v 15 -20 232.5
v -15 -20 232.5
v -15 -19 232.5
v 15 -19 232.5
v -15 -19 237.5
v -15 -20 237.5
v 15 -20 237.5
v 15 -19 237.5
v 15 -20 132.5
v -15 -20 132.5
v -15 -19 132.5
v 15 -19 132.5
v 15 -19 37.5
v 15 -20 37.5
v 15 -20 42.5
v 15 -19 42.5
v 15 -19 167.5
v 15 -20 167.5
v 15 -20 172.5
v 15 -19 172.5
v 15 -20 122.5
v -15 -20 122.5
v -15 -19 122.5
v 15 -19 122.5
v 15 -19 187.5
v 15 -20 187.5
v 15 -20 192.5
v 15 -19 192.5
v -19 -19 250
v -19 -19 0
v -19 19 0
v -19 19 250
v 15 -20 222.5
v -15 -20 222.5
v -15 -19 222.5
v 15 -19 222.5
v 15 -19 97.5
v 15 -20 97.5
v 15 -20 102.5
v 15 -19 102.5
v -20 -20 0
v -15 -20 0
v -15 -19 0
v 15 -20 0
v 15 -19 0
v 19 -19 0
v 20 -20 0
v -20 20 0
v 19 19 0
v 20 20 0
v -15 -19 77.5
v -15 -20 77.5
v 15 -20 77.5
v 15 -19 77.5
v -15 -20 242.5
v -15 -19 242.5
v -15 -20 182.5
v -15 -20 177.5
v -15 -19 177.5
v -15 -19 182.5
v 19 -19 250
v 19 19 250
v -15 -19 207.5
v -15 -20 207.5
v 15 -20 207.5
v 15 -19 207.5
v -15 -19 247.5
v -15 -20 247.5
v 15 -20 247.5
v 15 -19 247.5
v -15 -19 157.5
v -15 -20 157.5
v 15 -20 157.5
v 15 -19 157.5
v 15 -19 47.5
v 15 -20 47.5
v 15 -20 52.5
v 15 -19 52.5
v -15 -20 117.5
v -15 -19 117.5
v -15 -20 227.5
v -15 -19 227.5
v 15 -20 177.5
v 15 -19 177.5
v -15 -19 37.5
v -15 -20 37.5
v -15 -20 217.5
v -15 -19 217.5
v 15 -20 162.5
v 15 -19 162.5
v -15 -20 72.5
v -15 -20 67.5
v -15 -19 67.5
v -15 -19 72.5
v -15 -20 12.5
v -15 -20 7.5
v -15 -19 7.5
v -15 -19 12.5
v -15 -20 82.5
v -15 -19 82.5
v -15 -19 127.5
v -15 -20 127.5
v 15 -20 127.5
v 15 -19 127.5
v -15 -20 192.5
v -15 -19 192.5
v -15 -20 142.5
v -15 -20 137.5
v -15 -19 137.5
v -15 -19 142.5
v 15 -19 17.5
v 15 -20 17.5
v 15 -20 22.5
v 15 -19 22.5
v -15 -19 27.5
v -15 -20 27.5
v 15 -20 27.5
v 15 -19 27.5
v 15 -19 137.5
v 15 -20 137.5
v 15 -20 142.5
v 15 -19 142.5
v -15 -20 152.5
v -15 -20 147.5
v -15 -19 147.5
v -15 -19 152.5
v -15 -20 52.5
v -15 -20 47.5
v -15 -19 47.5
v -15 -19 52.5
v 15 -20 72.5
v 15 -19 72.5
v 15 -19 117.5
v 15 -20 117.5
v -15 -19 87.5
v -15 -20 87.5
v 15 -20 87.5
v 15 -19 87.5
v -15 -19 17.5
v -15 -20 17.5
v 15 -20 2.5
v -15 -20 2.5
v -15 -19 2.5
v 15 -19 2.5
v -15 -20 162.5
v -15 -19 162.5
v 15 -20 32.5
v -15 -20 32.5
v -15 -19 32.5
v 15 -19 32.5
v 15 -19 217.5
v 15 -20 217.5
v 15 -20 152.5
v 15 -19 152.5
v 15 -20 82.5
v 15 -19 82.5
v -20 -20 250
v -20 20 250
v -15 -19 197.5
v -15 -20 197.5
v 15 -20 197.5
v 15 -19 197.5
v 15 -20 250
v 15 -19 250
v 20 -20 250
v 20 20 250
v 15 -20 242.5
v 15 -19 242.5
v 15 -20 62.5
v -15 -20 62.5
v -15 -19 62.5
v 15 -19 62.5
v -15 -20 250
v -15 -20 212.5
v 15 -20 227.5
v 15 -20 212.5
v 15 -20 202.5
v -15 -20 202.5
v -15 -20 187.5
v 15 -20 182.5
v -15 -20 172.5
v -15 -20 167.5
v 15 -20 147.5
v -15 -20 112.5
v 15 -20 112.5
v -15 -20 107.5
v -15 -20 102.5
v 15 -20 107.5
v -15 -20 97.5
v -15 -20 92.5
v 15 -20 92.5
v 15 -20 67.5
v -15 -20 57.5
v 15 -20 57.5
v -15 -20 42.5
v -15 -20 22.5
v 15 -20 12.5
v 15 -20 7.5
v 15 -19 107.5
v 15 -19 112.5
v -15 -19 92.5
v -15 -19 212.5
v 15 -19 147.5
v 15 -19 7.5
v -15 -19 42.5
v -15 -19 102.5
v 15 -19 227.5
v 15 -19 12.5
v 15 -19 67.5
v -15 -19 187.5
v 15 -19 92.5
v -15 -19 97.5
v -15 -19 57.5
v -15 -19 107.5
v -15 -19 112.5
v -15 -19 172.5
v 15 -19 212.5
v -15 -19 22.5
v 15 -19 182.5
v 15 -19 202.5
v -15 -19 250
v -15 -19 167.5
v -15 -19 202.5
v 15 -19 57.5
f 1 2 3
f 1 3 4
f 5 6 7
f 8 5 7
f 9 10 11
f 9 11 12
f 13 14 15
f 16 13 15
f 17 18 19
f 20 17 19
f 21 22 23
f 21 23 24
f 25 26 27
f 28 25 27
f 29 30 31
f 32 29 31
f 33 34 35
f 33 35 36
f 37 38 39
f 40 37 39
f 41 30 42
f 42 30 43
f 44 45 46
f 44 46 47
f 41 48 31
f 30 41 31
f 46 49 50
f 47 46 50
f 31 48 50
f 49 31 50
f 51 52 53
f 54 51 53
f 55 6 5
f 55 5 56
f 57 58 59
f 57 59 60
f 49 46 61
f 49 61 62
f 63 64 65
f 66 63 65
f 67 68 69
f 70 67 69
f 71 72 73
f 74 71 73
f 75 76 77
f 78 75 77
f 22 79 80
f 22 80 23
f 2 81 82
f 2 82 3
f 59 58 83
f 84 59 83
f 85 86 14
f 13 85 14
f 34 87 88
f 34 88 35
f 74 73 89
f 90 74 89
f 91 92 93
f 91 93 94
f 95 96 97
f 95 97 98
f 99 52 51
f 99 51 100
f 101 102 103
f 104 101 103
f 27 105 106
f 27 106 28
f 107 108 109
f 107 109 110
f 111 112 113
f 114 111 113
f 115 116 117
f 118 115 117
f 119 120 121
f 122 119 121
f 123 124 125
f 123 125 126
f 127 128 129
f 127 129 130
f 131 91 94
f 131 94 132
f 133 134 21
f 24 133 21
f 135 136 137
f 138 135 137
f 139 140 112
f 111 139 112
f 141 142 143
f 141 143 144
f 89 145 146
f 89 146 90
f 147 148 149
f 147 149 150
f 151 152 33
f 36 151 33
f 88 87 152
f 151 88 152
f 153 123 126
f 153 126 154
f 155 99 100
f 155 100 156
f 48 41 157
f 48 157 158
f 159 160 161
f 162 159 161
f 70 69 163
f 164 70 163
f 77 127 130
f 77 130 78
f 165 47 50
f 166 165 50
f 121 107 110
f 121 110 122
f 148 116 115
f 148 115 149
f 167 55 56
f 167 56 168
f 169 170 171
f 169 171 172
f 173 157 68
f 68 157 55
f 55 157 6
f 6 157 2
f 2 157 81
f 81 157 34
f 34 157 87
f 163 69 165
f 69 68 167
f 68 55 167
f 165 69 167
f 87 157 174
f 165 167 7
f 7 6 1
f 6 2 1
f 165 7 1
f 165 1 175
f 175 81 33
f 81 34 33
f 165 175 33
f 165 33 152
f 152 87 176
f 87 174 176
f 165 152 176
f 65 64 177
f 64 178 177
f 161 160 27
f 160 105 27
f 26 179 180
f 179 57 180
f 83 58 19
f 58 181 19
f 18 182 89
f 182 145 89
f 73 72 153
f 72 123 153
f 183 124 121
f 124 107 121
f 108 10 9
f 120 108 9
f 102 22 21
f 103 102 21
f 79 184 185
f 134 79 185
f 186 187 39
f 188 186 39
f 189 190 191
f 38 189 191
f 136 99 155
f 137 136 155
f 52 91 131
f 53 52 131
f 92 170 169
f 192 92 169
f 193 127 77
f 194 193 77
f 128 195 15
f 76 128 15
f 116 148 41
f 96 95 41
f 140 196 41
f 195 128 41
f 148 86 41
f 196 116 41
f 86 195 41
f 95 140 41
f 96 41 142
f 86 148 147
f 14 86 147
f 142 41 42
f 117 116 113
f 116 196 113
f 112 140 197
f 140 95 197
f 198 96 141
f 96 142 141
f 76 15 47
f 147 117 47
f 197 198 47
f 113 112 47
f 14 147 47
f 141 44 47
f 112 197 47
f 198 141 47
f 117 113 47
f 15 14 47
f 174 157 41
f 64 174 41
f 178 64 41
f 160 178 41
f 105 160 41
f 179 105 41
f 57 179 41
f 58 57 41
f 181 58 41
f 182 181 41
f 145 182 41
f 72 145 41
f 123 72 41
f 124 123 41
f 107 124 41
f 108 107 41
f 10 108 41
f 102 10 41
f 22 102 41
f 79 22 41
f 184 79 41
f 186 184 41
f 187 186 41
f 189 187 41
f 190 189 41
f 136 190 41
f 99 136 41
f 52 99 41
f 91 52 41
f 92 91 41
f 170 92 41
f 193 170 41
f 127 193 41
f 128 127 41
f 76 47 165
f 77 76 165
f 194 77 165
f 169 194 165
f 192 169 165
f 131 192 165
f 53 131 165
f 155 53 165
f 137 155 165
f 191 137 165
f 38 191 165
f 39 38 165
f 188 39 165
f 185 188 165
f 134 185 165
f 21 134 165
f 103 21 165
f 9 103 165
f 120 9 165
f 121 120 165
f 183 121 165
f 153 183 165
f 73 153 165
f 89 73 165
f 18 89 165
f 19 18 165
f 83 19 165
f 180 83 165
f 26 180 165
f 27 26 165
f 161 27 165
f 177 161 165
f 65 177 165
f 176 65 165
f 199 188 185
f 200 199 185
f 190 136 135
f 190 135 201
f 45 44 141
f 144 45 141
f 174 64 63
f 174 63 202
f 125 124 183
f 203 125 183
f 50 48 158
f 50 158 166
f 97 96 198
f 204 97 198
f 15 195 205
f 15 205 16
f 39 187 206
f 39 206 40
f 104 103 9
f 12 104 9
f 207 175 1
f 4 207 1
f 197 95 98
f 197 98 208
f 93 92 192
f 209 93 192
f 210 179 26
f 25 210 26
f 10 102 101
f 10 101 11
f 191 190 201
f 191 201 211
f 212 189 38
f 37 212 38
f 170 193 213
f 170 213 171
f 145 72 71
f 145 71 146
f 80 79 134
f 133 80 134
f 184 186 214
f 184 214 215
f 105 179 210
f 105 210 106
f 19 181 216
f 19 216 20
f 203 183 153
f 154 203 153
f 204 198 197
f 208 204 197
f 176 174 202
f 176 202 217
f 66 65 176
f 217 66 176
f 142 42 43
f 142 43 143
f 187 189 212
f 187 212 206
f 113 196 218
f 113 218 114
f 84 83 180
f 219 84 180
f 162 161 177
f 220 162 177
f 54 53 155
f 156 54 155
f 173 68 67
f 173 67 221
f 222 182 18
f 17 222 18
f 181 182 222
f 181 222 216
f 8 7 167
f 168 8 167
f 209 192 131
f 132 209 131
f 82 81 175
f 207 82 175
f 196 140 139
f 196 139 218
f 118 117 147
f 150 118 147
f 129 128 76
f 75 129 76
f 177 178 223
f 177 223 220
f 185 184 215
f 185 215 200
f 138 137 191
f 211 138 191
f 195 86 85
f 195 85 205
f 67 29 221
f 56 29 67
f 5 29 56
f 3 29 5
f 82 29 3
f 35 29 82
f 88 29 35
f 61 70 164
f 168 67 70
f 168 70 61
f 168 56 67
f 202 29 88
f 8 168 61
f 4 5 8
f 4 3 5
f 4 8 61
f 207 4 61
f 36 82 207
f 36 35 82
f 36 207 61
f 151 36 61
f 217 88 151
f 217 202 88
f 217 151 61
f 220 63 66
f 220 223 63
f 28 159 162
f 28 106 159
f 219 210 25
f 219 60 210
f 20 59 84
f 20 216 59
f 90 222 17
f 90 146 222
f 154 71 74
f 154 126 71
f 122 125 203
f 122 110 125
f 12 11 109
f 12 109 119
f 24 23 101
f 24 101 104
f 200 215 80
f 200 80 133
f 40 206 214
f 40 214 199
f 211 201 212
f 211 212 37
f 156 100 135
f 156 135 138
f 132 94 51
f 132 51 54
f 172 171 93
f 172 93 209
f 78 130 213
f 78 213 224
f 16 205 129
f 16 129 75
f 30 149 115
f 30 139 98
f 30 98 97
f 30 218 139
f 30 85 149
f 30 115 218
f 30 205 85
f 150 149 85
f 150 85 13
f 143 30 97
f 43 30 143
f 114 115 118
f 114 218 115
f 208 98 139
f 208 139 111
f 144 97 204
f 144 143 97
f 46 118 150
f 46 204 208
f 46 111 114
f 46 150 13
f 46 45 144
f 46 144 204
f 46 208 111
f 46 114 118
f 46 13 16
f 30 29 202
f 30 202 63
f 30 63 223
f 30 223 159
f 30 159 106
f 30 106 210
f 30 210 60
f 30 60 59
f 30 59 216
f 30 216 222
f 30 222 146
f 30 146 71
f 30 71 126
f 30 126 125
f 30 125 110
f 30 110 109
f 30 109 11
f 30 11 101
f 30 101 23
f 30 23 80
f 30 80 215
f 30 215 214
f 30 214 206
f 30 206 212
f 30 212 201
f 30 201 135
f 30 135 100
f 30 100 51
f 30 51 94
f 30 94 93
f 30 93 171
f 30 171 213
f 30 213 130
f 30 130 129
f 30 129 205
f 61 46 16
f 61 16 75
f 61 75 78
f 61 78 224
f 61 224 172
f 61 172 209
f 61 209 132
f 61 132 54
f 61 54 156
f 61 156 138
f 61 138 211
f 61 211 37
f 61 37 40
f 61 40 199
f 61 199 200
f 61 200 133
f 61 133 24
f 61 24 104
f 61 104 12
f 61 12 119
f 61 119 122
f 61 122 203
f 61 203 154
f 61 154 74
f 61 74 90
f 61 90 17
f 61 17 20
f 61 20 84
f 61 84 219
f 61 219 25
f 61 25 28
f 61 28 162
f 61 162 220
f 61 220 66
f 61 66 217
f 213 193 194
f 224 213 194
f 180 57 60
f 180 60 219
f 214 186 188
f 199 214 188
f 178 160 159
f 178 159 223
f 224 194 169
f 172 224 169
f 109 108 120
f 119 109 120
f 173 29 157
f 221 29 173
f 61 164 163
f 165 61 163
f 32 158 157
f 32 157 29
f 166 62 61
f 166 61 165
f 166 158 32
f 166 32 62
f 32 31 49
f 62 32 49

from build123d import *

# Parameters (mm, degrees)
F0_W     = 40
F0_H     = 40
F0_W_2   = 38
F0_H_2   = 38
F1_DEPTH = 250
F2_W     = 30
F2_H     = 5
F3_DEPTH = 25


with BuildPart() as f1:
    # F0 (on Top) → F1 (new body)
    with BuildSketch(Plane.XY):
        Rectangle(F0_W, F0_H)
        Rectangle(F0_W_2, F0_H_2, mode=Mode.SUBTRACT)
    extrude(amount=F1_DEPTH)

    # F2 (on face) → F3 (cut)
    with BuildSketch(Plane.XZ.offset(20)):
        Rectangle(F2_W, F2_H)
        with Locations((0, 10)):
            Rectangle(F2_W, F2_H)
        with Locations((0, 20)):
            Rectangle(F2_W, F2_H)
        with Locations((0, 30)):
            Rectangle(F2_W, F2_H)
        with Locations((0, 40)):
            Rectangle(F2_W, F2_H)
        with Locations((0, 50)):
            Rectangle(F2_W, F2_H)
        with Locations((0, 60)):
            Rectangle(F2_W, F2_H)
        with Locations((0, 70)):
            Rectangle(F2_W, F2_H)
        with Locations((0, 80)):
            Rectangle(F2_W, F2_H)
        with Locations((0, 90)):
            Rectangle(F2_W, F2_H)
        with Locations((0, 100)):
            Rectangle(F2_W, F2_H)
        with Locations((0, 110)):
            Rectangle(F2_W, F2_H)
        with Locations((0, 120)):
            Rectangle(F2_W, F2_H)
        with Locations((0, 130)):
            Rectangle(F2_W, F2_H)
        with Locations((0, 140)):
            Rectangle(F2_W, F2_H)
        with Locations((0, 150)):
            Rectangle(F2_W, F2_H)
        with Locations((0, 160)):
            Rectangle(F2_W, F2_H)
        with Locations((0, 170)):
            Rectangle(F2_W, F2_H)
        with Locations((0, 180)):
            Rectangle(F2_W, F2_H)
        with Locations((0, 190)):
            Rectangle(F2_W, F2_H)
        with Locations((0, 200)):
            Rectangle(F2_W, F2_H)
        with Locations((0, 210)):
            Rectangle(F2_W, F2_H)
        with Locations((0, 220)):
            Rectangle(F2_W, F2_H)
        with Locations((0, 230)):
            Rectangle(F2_W, F2_H)
        with Locations((0, 240)):
            Rectangle(F2_W, F2_H)
        with Locations((0, 250)):
            Rectangle(F2_W, F2_H)
        with Locations((0, 260)):
            Rectangle(F2_W, F2_H)
        with Locations((0, 270)):
            Rectangle(F2_W, F2_H)
        with Locations((0, 280)):
            Rectangle(F2_W, F2_H)
        with Locations((0, 290)):
            Rectangle(F2_W, F2_H)
    extrude(amount=-F3_DEPTH, mode=Mode.SUBTRACT)


solid = f1.part
